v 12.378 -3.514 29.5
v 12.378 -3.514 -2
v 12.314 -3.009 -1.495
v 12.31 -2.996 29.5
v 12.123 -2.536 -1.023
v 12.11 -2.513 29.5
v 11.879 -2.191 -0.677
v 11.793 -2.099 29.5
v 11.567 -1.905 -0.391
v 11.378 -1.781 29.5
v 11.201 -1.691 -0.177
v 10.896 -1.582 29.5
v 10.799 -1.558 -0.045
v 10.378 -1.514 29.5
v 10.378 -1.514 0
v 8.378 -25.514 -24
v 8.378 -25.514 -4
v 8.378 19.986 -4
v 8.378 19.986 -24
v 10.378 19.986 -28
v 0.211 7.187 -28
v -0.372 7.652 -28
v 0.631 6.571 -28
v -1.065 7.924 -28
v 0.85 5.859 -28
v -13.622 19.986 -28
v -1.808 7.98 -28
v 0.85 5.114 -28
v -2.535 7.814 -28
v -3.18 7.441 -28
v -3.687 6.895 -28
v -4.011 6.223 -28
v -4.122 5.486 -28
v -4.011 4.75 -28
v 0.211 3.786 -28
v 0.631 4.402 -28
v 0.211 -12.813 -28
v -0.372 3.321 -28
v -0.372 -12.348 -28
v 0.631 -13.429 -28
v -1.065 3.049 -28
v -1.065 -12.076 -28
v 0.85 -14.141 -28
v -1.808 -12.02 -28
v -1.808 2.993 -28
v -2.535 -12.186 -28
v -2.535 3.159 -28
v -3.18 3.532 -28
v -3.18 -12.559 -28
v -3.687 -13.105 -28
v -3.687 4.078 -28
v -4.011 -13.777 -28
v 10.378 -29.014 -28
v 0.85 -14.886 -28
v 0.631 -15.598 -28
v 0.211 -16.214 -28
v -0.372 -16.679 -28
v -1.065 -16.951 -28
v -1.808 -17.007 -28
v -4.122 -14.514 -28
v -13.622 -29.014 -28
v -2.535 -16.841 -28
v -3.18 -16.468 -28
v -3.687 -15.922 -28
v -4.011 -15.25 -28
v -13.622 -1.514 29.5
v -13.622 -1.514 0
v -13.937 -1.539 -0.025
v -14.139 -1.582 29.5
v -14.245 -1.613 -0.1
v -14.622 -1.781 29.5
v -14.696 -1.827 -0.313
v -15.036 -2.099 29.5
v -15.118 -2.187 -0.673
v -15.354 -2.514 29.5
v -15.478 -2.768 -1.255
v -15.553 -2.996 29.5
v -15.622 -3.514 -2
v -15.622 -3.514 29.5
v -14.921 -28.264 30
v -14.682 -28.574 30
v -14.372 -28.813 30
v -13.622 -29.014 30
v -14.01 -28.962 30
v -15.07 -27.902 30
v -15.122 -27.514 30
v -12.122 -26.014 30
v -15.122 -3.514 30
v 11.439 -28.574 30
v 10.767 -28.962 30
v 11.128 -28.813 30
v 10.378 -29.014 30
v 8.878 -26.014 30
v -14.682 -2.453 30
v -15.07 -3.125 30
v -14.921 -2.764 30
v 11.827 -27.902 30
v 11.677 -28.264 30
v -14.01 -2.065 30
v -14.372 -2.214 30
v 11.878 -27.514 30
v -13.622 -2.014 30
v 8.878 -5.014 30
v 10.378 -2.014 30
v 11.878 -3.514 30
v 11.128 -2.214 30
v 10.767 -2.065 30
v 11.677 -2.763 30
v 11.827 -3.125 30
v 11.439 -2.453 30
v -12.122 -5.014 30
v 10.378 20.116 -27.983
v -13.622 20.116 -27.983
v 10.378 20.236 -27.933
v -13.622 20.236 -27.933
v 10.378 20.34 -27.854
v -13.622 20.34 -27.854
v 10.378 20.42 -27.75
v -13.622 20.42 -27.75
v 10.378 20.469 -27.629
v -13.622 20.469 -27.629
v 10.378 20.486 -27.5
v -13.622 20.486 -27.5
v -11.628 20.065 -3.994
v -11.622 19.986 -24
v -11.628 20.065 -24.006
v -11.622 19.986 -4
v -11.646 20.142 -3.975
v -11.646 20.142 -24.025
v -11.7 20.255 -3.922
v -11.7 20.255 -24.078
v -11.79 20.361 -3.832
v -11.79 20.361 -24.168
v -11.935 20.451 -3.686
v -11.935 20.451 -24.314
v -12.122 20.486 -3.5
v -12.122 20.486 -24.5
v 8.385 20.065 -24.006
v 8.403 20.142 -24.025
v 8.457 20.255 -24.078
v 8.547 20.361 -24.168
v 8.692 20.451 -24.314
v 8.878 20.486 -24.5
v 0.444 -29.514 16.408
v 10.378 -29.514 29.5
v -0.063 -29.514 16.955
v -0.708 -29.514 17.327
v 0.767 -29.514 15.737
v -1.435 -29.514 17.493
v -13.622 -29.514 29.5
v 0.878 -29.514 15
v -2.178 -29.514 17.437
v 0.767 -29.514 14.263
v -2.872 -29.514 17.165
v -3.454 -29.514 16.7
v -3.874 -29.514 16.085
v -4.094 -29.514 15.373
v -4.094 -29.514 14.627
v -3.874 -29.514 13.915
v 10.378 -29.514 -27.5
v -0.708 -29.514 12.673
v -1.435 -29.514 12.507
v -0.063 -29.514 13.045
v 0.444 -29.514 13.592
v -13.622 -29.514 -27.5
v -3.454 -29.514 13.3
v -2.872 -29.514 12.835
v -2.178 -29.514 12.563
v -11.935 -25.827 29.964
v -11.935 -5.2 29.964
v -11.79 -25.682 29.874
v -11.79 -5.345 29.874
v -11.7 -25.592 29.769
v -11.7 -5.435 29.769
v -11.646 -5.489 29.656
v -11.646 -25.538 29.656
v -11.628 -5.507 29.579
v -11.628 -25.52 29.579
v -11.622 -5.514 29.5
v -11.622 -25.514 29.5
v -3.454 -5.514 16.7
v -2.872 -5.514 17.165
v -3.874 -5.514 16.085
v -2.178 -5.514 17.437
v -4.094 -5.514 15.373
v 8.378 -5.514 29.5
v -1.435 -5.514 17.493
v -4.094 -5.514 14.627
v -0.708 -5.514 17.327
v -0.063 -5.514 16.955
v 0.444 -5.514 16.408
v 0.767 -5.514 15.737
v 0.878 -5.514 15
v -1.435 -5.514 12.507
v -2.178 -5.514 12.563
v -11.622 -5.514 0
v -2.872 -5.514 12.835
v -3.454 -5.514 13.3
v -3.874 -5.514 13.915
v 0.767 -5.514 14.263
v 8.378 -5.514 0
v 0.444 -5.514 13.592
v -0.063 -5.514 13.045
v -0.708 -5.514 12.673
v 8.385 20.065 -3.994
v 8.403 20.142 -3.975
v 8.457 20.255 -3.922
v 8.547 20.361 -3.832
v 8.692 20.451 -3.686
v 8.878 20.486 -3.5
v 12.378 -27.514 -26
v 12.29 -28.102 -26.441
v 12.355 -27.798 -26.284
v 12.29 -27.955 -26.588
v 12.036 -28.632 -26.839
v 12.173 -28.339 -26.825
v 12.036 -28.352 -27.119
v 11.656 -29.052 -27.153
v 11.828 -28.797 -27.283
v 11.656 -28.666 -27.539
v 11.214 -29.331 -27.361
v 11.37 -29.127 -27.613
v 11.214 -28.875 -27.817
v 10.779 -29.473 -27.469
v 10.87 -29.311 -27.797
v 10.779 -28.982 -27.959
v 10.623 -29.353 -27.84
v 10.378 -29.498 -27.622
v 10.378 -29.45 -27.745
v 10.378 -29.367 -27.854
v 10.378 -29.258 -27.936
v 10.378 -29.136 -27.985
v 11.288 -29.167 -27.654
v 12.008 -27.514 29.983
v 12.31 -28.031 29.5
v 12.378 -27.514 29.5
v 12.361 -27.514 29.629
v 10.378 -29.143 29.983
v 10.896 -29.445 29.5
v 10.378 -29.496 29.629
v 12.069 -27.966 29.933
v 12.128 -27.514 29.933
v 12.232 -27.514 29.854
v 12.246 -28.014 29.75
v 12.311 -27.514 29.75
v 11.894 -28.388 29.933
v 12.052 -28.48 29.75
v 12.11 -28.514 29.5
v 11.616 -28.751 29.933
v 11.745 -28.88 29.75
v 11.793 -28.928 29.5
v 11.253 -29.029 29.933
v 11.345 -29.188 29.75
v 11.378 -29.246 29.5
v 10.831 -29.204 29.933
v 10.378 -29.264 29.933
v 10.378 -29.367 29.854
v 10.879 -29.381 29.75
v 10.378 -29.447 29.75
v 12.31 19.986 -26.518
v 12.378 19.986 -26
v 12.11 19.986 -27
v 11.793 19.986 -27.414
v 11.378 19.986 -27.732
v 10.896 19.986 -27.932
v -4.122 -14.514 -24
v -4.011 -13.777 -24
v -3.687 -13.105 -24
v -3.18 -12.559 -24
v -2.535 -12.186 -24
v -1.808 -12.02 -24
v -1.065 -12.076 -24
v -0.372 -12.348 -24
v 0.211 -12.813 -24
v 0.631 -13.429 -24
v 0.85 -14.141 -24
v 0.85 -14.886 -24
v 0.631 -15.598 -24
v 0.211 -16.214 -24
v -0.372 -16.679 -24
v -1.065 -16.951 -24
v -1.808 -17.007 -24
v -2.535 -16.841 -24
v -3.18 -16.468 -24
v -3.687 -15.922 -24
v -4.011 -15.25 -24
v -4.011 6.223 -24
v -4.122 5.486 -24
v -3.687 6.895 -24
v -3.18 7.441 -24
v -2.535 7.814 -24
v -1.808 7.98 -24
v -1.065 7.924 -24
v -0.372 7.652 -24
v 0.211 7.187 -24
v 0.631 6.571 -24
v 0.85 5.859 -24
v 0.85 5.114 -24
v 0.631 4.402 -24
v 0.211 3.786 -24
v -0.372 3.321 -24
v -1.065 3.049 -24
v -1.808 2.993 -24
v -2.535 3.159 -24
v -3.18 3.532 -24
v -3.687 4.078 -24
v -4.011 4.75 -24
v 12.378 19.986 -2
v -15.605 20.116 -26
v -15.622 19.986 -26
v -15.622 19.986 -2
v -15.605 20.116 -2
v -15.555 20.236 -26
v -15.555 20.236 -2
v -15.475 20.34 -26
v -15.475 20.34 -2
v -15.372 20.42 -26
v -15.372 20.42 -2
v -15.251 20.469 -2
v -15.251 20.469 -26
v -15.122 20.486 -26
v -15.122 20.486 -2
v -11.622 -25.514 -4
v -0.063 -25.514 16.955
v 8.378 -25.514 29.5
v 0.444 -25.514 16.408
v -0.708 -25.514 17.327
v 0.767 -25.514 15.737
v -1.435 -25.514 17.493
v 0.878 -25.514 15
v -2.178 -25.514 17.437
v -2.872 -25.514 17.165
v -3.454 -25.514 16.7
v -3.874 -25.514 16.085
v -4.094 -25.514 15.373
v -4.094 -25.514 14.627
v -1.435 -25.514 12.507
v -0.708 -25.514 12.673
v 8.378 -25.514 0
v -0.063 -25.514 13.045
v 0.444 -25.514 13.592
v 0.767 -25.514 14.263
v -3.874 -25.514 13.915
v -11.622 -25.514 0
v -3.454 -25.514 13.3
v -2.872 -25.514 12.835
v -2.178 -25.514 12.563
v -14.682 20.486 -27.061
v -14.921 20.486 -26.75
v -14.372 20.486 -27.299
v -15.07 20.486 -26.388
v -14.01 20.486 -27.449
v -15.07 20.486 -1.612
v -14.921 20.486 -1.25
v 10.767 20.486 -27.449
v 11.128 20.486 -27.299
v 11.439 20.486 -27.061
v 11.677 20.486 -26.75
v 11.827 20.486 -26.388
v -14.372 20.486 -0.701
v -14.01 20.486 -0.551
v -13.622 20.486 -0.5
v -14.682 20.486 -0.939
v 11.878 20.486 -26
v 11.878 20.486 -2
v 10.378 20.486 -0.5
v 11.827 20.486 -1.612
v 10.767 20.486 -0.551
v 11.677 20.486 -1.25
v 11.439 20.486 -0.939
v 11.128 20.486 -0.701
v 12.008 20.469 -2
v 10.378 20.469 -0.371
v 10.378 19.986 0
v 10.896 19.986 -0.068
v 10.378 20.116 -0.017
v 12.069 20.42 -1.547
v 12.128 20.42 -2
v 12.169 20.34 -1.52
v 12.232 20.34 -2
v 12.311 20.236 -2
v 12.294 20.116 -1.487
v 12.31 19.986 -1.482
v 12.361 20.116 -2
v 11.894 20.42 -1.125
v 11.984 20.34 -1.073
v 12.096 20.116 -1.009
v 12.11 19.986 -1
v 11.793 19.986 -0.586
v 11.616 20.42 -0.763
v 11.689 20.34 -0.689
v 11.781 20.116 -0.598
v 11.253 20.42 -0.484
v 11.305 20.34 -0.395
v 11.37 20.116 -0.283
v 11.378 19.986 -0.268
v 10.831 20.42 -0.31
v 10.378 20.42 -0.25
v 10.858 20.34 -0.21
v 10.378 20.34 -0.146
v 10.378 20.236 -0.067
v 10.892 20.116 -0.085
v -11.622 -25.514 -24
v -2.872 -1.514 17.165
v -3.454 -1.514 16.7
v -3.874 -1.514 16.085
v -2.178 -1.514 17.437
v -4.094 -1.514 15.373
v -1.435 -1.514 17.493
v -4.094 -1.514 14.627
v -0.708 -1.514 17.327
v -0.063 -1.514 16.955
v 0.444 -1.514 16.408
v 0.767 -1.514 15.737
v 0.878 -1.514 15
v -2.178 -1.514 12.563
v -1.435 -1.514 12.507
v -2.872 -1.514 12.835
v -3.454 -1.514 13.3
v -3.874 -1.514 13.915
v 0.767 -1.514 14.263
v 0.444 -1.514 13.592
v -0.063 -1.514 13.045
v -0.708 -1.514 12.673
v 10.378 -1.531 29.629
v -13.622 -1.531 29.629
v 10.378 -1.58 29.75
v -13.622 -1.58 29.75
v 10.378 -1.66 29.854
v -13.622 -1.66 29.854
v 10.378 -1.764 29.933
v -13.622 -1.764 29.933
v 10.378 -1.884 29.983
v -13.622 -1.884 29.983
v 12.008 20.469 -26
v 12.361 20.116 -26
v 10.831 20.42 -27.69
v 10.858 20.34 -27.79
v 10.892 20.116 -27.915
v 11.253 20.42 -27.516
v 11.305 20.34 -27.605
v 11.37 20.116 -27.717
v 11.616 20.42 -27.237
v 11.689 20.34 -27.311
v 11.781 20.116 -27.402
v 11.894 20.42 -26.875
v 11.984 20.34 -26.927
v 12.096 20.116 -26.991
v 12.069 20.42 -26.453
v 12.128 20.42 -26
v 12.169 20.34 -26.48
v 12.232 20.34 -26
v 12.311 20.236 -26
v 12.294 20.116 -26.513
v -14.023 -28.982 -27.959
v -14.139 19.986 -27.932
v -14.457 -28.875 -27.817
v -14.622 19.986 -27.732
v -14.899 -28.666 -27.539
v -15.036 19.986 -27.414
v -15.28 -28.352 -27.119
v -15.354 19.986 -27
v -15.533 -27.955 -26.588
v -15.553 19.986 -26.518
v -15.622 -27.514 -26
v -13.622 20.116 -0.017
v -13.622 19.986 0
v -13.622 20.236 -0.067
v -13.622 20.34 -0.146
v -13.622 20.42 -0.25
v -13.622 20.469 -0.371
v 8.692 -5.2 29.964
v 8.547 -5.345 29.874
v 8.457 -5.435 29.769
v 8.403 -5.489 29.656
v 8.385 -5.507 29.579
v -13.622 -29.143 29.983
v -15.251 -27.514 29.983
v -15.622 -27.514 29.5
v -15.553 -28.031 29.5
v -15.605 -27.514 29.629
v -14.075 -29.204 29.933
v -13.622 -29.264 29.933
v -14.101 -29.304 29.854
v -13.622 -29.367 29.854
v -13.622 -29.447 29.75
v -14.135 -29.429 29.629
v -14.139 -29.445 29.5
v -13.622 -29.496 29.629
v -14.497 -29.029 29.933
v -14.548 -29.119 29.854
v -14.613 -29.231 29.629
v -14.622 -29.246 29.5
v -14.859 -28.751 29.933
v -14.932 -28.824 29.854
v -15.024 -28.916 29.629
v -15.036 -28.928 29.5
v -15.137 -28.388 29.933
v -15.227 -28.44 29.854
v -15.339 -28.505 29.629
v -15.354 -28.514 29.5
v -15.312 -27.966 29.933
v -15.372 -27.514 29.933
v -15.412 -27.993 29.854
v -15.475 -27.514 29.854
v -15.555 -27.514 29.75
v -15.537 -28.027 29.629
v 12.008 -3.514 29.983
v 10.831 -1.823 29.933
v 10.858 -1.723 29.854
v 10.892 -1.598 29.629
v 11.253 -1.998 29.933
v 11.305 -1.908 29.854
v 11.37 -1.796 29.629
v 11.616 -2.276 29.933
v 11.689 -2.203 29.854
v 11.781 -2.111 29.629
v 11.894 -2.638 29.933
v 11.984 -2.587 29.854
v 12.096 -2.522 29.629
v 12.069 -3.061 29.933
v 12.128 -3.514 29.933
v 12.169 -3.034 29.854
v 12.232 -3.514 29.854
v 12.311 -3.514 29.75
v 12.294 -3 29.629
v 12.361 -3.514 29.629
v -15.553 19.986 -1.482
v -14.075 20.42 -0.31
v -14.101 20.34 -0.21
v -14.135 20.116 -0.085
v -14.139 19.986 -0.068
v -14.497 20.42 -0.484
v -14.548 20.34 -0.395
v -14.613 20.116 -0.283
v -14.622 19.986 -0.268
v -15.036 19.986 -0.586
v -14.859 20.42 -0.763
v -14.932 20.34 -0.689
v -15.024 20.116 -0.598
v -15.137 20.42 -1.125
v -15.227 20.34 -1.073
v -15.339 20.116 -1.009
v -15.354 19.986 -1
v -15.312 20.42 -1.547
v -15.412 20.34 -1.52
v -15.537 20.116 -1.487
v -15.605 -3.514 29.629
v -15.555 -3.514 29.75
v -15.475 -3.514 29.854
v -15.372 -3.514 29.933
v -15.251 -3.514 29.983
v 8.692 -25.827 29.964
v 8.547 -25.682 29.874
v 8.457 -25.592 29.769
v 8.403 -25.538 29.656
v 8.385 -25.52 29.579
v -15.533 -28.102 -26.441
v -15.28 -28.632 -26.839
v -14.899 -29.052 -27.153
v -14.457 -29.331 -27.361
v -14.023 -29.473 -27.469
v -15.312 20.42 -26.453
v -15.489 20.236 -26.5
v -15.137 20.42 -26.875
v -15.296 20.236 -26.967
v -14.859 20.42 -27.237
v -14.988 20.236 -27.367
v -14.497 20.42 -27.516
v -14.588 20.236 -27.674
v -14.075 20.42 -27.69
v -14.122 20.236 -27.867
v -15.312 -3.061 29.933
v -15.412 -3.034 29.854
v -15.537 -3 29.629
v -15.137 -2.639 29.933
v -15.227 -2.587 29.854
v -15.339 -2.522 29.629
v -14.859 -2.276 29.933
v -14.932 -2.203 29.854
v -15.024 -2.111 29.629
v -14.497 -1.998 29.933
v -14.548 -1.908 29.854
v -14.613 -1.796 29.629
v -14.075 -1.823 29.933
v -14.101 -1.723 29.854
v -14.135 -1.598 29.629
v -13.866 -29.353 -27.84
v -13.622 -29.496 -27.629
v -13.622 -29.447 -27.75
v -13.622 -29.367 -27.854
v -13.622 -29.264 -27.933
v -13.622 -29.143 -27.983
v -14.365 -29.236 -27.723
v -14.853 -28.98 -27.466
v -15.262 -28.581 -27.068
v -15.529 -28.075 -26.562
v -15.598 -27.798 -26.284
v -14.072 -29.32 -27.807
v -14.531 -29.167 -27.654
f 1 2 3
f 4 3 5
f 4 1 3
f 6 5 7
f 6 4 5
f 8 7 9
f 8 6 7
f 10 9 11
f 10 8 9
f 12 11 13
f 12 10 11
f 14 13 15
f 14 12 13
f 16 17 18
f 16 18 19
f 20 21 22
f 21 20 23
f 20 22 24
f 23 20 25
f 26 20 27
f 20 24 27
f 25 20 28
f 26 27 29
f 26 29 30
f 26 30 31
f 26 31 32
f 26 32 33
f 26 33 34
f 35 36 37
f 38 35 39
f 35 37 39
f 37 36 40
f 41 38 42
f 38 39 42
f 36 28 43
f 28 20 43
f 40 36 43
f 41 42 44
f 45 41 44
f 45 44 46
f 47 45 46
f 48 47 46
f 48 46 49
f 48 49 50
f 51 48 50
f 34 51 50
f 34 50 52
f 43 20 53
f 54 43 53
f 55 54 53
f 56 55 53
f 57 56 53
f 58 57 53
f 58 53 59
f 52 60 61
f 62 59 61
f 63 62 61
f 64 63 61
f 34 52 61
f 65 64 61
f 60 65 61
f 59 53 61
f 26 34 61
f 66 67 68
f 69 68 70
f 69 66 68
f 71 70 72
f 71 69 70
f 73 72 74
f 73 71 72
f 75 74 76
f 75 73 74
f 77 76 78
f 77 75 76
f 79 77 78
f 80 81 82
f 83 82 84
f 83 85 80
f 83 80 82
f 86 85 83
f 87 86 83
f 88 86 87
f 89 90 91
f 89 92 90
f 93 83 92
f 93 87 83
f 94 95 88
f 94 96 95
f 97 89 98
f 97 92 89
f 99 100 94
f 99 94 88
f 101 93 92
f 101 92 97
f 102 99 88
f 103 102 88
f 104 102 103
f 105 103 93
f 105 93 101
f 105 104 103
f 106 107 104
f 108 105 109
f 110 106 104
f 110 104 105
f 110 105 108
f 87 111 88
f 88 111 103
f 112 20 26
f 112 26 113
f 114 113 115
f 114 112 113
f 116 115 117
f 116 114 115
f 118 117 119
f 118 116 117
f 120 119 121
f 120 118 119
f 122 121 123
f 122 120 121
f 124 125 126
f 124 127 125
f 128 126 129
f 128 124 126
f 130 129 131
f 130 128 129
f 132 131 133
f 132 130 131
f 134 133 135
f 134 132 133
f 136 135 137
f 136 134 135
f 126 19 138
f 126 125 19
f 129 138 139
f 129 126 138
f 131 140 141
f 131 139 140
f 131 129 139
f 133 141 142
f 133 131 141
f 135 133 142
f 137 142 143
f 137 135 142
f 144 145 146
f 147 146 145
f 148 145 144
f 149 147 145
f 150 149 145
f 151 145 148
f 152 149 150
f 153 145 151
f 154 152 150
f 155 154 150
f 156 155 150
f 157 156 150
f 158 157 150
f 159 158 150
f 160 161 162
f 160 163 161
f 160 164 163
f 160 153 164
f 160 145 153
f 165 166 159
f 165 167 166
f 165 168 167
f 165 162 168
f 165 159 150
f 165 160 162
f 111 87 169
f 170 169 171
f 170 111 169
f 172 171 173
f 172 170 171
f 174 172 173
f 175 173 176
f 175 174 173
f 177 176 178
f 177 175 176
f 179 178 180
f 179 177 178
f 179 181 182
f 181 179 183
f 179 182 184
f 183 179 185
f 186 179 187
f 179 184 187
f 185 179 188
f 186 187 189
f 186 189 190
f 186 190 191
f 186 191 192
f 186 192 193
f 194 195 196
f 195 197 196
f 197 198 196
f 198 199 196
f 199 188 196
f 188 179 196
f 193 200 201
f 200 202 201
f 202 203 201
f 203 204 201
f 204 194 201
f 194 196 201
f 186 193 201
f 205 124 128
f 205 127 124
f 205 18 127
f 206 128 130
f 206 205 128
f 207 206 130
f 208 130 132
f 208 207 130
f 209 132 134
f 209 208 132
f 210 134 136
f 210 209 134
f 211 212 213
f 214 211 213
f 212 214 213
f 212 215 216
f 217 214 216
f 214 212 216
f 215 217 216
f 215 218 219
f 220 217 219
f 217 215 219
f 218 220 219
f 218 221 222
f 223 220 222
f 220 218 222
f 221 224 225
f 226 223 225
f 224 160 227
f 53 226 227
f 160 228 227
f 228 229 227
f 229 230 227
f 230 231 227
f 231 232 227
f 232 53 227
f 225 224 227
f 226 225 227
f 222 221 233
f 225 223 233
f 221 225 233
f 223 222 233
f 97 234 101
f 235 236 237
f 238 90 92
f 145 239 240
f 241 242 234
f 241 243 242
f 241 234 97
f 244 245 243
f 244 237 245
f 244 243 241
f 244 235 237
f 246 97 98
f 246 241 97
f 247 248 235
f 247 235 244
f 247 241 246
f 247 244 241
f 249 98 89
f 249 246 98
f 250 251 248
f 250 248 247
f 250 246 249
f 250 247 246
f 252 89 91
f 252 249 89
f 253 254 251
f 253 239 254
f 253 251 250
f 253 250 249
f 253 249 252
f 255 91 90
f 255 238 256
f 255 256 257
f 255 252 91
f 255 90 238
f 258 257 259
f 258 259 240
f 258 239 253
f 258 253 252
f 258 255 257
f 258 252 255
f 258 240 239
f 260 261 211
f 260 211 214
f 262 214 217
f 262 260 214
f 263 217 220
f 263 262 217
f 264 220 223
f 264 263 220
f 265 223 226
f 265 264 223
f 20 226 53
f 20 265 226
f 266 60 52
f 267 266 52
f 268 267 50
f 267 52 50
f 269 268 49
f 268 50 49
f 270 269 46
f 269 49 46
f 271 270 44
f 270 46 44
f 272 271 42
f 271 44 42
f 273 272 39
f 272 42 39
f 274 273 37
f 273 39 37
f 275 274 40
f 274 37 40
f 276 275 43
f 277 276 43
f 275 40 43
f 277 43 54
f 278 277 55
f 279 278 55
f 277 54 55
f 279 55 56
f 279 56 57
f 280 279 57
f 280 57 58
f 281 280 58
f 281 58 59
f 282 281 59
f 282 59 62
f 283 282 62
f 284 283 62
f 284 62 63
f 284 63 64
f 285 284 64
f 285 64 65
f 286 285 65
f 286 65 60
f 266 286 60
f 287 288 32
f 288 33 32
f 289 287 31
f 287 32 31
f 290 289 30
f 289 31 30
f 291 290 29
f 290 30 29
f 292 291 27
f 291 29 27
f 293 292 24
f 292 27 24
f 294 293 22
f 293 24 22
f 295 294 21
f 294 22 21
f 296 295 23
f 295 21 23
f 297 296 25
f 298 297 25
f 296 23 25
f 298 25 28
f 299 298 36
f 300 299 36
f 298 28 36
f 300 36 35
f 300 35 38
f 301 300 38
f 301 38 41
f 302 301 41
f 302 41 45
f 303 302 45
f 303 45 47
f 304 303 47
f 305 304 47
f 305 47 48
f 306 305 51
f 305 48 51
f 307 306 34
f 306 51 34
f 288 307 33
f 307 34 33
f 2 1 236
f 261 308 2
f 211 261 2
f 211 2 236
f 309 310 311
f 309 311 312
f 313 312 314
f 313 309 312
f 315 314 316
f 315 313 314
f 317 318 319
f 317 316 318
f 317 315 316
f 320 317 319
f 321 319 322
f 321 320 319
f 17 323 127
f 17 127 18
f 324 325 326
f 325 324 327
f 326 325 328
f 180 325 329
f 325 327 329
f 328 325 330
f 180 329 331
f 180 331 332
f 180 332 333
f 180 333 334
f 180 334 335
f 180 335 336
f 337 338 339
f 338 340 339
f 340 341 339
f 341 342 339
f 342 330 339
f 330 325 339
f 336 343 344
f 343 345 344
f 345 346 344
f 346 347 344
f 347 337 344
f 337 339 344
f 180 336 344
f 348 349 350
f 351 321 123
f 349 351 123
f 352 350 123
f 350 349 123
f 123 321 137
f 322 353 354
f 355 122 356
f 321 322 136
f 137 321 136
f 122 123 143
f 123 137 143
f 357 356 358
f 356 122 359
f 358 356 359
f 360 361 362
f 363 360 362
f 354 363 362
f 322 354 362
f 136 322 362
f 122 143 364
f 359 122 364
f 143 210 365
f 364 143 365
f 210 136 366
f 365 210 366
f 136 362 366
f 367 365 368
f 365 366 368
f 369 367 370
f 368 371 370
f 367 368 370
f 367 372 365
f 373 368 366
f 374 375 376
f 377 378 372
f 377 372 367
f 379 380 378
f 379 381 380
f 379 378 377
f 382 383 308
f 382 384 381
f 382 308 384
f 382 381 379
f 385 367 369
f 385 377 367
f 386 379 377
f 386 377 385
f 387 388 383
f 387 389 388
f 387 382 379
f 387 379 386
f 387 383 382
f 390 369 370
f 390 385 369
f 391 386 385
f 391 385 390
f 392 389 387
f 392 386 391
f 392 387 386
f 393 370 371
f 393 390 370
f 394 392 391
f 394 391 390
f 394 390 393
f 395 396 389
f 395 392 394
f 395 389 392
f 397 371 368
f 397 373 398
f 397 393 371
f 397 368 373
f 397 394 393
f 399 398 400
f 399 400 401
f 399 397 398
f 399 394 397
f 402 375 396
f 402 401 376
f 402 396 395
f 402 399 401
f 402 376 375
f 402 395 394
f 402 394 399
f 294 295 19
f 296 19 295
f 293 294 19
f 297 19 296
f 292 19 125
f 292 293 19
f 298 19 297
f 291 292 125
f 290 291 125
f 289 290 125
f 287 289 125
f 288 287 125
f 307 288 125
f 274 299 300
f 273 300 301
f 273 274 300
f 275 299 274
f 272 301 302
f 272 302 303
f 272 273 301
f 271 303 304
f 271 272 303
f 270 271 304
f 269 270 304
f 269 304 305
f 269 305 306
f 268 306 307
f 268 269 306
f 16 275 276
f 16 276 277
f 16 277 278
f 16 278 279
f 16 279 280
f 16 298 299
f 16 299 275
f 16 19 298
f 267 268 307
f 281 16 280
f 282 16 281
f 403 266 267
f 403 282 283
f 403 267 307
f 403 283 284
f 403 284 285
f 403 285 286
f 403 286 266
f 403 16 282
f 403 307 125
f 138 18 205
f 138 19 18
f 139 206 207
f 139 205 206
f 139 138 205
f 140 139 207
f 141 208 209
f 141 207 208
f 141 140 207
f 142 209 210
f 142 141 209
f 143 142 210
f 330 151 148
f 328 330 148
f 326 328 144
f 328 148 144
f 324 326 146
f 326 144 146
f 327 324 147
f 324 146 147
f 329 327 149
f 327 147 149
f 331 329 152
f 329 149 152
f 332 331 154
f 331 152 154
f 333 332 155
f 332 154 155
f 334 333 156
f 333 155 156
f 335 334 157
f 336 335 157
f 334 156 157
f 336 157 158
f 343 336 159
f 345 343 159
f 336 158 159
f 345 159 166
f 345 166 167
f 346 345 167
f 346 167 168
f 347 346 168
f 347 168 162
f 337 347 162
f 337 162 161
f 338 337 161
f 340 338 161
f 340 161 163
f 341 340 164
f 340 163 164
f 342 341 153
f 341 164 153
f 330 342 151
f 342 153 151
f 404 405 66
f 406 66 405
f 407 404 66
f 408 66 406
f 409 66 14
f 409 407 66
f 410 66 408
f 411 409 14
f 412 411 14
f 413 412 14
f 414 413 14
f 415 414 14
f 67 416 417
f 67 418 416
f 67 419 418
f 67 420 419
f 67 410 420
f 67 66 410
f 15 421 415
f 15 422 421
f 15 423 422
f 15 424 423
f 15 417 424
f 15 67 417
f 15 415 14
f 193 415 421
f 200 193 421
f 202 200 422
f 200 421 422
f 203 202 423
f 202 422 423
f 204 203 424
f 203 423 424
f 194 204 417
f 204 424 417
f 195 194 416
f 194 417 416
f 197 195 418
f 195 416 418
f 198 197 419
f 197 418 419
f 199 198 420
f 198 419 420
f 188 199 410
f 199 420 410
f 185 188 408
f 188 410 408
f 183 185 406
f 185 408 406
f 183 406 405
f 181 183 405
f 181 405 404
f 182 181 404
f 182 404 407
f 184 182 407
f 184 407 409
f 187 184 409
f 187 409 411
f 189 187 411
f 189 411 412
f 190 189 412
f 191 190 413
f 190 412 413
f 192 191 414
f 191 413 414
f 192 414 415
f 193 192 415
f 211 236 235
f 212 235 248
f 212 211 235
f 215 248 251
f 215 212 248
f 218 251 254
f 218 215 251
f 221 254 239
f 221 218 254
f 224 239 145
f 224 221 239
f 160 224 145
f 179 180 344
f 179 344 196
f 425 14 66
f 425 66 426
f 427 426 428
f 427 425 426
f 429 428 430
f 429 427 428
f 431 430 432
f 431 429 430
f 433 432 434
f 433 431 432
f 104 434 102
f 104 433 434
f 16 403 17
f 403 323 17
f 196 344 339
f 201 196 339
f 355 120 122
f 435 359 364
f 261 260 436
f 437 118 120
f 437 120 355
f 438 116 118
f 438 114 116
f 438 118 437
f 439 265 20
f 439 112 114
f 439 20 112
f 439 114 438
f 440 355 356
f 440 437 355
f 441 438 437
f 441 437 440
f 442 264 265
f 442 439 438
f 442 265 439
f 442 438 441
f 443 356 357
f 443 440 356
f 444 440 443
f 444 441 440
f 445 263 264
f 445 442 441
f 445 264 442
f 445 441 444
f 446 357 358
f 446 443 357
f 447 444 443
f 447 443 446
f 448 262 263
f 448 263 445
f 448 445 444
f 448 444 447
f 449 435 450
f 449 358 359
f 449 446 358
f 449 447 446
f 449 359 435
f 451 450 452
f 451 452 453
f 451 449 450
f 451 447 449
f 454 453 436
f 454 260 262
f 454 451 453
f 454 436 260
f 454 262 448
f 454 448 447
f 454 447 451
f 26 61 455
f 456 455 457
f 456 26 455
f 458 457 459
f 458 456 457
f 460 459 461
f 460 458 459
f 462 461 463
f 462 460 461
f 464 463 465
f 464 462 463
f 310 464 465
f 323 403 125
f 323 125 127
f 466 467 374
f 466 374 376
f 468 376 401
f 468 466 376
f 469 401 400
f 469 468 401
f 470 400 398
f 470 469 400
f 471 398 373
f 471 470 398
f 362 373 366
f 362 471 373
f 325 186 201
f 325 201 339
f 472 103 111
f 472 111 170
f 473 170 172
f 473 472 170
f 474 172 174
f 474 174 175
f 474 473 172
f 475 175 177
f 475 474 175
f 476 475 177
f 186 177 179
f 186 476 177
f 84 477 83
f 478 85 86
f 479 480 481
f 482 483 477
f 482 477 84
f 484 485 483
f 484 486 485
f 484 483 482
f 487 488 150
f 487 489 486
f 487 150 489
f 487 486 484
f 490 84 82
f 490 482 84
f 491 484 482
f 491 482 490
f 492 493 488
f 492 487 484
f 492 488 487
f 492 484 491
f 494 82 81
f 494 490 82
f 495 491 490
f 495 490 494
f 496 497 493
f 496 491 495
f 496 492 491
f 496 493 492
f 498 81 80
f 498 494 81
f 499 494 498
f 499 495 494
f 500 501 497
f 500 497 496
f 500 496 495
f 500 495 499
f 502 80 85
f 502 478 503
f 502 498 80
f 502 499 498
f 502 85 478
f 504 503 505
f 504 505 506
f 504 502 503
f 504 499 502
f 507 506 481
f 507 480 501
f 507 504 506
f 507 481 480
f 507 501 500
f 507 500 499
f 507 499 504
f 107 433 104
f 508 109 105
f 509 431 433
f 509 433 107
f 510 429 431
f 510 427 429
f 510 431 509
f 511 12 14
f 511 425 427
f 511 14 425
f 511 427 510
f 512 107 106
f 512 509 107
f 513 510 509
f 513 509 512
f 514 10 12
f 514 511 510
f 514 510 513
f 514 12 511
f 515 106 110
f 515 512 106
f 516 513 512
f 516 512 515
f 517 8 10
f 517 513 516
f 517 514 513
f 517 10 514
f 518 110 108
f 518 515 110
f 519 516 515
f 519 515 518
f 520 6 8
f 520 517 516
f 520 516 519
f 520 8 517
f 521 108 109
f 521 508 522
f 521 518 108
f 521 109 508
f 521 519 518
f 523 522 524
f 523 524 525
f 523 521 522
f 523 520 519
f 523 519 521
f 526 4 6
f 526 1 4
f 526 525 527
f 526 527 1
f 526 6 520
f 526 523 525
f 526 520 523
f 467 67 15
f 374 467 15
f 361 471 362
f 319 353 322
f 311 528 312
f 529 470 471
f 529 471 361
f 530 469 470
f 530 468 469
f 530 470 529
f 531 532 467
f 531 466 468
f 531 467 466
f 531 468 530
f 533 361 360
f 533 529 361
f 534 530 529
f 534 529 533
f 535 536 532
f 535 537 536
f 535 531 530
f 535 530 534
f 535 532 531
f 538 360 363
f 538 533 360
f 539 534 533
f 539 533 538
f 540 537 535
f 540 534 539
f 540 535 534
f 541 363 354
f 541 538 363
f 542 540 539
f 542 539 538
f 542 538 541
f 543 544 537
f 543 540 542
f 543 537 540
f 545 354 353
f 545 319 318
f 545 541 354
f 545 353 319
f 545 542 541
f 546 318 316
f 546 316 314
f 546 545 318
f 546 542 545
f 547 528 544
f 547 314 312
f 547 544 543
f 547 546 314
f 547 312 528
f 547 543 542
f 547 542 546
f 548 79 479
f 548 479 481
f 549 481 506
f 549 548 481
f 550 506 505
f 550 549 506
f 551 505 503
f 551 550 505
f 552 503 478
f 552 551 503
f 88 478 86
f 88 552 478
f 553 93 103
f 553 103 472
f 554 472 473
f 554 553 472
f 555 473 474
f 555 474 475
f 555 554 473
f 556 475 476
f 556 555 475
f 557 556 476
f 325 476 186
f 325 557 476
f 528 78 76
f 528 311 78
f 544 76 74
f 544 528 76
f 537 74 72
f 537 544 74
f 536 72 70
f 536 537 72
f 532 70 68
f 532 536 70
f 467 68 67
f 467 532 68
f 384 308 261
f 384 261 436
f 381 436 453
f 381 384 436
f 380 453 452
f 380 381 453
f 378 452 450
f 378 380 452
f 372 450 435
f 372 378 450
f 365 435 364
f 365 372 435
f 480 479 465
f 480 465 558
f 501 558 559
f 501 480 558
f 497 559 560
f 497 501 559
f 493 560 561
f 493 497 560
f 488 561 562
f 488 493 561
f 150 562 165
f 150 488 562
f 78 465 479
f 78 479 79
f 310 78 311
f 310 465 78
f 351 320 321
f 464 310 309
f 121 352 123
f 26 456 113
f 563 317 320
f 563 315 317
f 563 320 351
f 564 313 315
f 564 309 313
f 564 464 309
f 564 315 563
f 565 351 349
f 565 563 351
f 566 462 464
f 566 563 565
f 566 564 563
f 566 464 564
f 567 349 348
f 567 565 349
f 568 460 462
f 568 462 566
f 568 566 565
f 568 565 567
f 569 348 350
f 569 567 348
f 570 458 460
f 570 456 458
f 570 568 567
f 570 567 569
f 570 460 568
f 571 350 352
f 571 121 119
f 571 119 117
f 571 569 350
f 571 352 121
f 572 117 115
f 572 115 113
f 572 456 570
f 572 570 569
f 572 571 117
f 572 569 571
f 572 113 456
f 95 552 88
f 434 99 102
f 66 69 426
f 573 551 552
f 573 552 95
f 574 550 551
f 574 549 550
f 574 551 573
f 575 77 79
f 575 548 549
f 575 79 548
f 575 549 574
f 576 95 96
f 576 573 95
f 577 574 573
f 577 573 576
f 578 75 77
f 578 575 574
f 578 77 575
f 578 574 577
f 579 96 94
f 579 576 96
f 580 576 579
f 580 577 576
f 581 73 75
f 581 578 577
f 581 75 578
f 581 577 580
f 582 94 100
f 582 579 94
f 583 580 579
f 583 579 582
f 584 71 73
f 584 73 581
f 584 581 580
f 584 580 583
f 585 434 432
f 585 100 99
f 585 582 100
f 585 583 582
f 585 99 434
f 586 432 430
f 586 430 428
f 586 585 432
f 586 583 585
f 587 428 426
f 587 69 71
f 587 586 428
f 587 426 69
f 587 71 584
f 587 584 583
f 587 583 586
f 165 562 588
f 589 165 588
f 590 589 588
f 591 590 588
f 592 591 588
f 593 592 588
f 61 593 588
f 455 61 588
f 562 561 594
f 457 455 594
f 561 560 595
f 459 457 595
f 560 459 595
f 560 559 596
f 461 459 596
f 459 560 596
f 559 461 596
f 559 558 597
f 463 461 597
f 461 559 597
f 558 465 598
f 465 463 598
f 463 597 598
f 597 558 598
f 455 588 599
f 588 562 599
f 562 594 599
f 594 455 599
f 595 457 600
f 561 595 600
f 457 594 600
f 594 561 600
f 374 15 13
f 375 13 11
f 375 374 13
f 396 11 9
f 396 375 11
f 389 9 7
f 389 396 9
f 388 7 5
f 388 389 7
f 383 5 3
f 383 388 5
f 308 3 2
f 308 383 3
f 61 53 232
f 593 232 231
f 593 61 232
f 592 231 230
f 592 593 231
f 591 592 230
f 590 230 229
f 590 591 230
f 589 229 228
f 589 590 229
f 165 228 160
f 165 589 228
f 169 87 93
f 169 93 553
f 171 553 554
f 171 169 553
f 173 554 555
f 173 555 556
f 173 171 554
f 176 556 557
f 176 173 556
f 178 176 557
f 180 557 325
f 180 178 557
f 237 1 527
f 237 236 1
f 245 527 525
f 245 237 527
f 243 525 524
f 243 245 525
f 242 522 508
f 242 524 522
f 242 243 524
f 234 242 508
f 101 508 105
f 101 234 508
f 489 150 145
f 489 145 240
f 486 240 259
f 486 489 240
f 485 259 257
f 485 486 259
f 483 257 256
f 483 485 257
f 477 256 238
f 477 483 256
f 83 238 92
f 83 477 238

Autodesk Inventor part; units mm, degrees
sketch "Sketch1" plane through (0, 0, 0) normal (0, 0, 1) x (1, 0, 0)
  line L0 (-11.6216, -5.5135) -> (8.3784, -5.5135)
  line L1 (8.3784, -5.5135) -> (8.3784, -25.5135)
  line L2 (8.3784, -25.5135) -> (-11.6216, -25.5135)
  line L3 (-11.6216, -25.5135) -> (-11.6216, -5.5135)
  line L4 (-15.6216, -1.5135) -> (12.3784, -1.5135)
  line L5 (12.3784, -1.5135) -> (12.3784, -29.5135)
  line L6 (12.3784, -29.5135) -> (-15.6216, -29.5135)
  line L7 (-15.6216, -29.5135) -> (-15.6216, -1.5135)
  point P0 (0, 0)
  dimension "d0" = 20
  dimension "d1" = 20
  dimension "d2" = 4
  dimension "d3" = 4
  dimension "d4" = 4
  dimension "d5" = 4
extrude "Extrusion1" add sketch "Sketch1" along normal blind 30
ref_plane "Work Plane3" through (-15.6216, -29.5135, 0) normal (0, -1, 0) x (1, 0, 0)
sketch "Sketch2" plane through (-15.6216, -29.5135, 0) normal (0, -1, 0) x (1, 0, 0)
  line L0 (0, 0) -> (28, 0)
  line L1 (28, 0) -> (28, -28)
  line L2 (28, -28) -> (0, -28)
  line L3 (0, -28) -> (0, 0)
  line L4 (24, -24) -> (4, -24)
  line L5 (4, -24) -> (4, -4)
  line L6 (4, -4) -> (24, -4)
  line L7 (24, -4) -> (24, -24)
  point P0 (15.6216, 0)
  point P1 (0, -14)
  dimension "d10" = 28
  dimension "d11" = 28
  dimension "d12" = 4
  dimension "d13" = 4
  dimension "d14" = 4
  dimension "d15" = 4
extrude "Extrusion2" add sketch "Sketch2" against normal blind 50
ref_plane "Work Plane4" through (12.3784, -29.5135, -28) normal (0, 0, -1) x (-1, 0, 0)
sketch "Sketch3" plane through (12.3784, -29.5135, -28) normal (0, 0, -1) x (-1, 0, 0)
  circle A0 centre (14, 35) radius 2.5
  circle A1 centre (14, 15) radius 2.5
  line L0 (28, 0) -> (28, 50) projected
  line L1 (28, 0) -> (0, 0) projected
  point P0 (12.3784, 29.5135)
  dimension "d19" = 14
  dimension "d20" = 14
  dimension "d21" = 20
  dimension "d22" = 15
  dimension "d23" = 5
  dimension "d24" = 5
ref_plane "Work Plane5" through (-15.6216, -1.5135, 30) normal (0, 1, 0) x (1, 0, 0)
sketch "Sketch4" plane through (-15.6216, -1.5135, 30) normal (0, 1, 0) x (1, 0, 0)
  circle A0 centre (14, 15) radius 2.5
  line L0 (28, 30) -> (28, 0) projected
  line L1 (28, 0) -> (0, 0) projected
  point P0 (15.6216, 30)
  dimension "d26" = 5
  dimension "d27" = 14
  dimension "d28" = 15
ref_plane "Work Plane6" through (-15.6216, -29.5135, 30) normal (0, -1, 0) x (1, 0, 0)
sketch "Sketch5" plane through (-15.6216, -29.5135, 30) normal (0, -1, 0) x (1, 0, 0)
  circle A0 centre (14, -15) radius 2.5
  line L0 (0, -30) -> (0, 0) projected
  line L1 (24, 0) -> (4, 0) projected
  point P0 (15.6216, -30)
  dimension "d30" = 5
  dimension "d31" = 14
  dimension "d32" = 15
extrude "Extrusion3" cut sketch "Sketch4" against normal blind 4
extrude "Extrusion4" cut sketch "Sketch5" against normal blind 4
extrude "Extrusion5" cut sketch "Sketch3" against normal blind 4
fillet "Fillet1" radius 2 8 edges at (12.3784, -1.5135, 15) (12.3784, 9.4865, 0) (12.3784, -29.5135, 1) (12.3784, -4.5135, -28) (-15.6216, 9.4865, 0) (-15.6216, -1.5135, 15) (-15.6216, -4.5135, -28) (-15.6216, -29.5135, 1)
fillet "Fillet2" radius 0.5 31 edges at (-1.6216, -29.5135, -24) (8.3784, -29.5135, -14) (-11.6216, -29.5135, -14) (-1.6216, -29.5135, -4) (11.7926, -28.9277, -27.4142) (-15.0358, -28.9277, -27.4142) (-1.6216, -29.5135, -28) (-1.6216, 20.4865, -24) (-11.6216, 20.4865, -14) (8.3784, 20.4865, -14) (-1.6216, 20.4865, -4) (-15.0358, 20.4865, -27.4142) (-15.6216, 20.4865, -14) (-15.0358, 20.4865, -0.5858) (-1.6216, 20.4865, 0) (11.7926, 20.4865, -0.5858) (12.3784, 20.4865, -14) (11.7926, 20.4865, -27.4142) (-1.6216, 20.4865, -28) (-1.6216, -25.5135, 30) (8.3784, -15.5135, 30) (-1.6216, -5.5135, 30) (-11.6216, -15.5135, 30) (11.7926, -28.9277, 30) (12.3784, -15.5135, 30) (11.7926, -2.0993, 30) (-1.6216, -1.5135, 30) (-15.0358, -2.0993, 30) (-15.6216, -15.5135, 30) (-15.0358, -28.9277, 30) (-1.6216, -29.5135, 30)
ref_plane "Work Plane7" through (-13.6216, -29.5135, 29.5) normal (0, -1, 0) x (1, 0, 0)
sketch "Sketch6" plane through (-13.6216, -29.5135, 29.5) normal (0, -1, 0) x (1, 0, 0)
  line L0 (23.2157, -54.9948) -> (0.8161, -54.9948)
  line L1 (0.8161, -54.9948) -> (0.8161, -31.6008)
  line L2 (0.8161, -31.6008) -> (23.2157, -31.6008)
  line L3 (23.2157, -31.6008) -> (23.2157, -54.9948)
  point P0 (13.6216, -29.5)
extrude "Extrusion6" add sketch "Sketch6" against normal blind 4
properties part number "fixed_joint"
